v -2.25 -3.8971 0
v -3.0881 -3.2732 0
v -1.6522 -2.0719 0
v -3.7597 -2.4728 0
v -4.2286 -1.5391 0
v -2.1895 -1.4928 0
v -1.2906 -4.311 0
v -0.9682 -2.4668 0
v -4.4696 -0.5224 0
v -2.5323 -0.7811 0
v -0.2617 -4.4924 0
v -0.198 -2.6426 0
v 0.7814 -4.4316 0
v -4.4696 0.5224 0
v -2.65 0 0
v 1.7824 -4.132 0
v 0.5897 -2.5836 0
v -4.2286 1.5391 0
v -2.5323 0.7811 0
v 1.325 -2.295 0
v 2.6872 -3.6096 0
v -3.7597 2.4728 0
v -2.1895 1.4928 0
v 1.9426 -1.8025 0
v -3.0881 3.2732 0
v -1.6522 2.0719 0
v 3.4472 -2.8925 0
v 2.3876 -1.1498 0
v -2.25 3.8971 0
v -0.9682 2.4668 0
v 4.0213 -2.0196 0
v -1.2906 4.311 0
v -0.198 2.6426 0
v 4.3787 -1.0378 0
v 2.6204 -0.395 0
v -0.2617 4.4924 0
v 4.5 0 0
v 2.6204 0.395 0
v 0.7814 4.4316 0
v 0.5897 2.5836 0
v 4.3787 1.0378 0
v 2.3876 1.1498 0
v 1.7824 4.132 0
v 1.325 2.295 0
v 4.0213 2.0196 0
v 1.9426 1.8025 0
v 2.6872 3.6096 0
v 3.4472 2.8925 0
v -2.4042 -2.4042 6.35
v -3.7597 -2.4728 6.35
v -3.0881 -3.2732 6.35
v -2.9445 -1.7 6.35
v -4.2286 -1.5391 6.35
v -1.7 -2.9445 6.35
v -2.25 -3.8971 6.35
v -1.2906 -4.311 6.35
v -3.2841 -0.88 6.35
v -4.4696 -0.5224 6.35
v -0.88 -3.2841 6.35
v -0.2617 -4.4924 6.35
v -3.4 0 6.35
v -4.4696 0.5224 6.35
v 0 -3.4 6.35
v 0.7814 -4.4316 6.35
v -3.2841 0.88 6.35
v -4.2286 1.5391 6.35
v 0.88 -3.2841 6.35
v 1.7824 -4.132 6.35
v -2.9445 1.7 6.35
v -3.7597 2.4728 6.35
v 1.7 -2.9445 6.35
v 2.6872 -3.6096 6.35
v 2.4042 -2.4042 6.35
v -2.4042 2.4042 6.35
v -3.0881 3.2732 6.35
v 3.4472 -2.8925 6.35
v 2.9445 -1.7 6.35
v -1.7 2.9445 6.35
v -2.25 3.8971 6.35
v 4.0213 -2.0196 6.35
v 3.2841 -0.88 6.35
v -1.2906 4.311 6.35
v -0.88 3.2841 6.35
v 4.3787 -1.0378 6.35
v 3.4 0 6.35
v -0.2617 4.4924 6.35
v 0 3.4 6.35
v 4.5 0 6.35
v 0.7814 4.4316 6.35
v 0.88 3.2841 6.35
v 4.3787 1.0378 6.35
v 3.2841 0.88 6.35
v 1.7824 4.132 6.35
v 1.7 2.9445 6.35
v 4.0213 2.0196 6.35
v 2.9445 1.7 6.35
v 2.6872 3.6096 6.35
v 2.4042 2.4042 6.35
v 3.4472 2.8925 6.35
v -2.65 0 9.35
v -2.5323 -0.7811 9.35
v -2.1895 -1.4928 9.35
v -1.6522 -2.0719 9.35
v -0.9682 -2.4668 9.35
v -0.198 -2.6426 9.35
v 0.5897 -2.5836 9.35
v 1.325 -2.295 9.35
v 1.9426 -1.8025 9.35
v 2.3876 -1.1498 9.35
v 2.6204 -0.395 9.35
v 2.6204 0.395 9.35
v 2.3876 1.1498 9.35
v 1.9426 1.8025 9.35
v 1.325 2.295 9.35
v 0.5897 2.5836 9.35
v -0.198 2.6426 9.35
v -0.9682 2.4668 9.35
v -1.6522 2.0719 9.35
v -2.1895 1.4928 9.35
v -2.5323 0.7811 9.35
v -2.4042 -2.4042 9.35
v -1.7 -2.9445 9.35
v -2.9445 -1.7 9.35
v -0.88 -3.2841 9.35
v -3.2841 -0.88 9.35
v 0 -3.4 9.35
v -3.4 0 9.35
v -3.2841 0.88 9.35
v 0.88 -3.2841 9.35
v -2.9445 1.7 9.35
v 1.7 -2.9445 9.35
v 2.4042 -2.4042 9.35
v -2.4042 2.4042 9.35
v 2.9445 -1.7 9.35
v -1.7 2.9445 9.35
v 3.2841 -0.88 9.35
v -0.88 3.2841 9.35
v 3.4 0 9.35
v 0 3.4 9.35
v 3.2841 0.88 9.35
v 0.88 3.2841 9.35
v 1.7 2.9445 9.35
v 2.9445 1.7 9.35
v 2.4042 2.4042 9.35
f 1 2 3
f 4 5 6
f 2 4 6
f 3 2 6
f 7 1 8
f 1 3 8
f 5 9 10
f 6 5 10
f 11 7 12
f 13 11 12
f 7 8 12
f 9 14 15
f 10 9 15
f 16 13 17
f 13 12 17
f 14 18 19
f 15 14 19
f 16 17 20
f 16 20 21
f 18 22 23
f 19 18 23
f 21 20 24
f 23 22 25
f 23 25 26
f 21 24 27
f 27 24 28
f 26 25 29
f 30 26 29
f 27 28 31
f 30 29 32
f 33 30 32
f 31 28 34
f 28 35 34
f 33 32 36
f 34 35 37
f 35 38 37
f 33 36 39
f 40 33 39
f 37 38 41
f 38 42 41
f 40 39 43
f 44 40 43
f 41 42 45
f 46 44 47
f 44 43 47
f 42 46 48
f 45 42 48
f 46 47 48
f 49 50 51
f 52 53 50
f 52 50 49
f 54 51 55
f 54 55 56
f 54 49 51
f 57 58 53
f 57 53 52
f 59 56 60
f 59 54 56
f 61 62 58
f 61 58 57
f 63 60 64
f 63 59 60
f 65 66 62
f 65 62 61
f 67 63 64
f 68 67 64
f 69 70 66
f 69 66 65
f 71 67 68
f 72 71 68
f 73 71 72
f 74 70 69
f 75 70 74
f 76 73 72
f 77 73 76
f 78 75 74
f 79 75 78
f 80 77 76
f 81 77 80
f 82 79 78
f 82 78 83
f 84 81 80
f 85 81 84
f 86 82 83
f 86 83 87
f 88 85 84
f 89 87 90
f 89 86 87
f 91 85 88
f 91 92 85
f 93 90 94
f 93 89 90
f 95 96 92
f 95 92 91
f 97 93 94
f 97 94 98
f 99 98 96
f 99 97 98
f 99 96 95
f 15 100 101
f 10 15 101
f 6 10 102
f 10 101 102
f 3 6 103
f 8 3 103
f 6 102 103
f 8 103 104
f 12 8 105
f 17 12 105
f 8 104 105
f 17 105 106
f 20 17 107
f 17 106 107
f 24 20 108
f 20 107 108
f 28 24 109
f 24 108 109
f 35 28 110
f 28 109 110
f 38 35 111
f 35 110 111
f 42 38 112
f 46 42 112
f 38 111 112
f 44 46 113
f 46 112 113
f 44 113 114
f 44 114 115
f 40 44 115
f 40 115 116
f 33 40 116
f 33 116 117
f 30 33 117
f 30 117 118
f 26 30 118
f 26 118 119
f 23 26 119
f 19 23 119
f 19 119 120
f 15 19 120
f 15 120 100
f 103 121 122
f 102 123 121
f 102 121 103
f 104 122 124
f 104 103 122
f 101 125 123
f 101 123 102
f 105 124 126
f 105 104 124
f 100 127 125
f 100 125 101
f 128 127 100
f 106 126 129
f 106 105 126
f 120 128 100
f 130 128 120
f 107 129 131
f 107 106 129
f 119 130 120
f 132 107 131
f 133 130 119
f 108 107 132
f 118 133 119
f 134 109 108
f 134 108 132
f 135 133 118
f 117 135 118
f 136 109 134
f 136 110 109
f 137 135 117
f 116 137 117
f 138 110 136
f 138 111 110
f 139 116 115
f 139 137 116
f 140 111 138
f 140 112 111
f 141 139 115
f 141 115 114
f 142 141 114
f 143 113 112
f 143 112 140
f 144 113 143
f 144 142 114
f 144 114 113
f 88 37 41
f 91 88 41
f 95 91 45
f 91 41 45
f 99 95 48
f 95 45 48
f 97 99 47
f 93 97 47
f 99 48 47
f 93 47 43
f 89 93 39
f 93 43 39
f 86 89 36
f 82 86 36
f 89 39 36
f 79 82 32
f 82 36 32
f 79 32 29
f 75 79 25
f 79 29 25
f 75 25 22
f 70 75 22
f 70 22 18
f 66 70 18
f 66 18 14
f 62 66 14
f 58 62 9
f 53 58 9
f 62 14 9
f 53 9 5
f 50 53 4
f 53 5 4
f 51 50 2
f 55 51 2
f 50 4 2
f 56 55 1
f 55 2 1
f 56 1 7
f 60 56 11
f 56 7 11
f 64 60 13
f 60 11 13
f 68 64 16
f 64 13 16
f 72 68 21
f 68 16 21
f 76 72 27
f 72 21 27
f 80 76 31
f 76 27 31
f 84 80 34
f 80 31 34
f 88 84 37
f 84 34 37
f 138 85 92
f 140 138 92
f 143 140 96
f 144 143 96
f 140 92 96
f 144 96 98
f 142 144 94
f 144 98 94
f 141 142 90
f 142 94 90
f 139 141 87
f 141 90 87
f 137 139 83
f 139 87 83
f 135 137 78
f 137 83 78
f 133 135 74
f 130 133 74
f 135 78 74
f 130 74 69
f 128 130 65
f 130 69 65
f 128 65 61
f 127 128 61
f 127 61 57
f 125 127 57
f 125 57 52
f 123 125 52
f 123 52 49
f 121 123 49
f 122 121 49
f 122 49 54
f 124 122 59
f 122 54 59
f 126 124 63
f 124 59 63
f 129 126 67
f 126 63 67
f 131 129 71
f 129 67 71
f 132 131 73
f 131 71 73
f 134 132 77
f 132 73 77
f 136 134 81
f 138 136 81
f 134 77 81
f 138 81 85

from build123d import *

# Parameters (mm, degrees)
F0_R     = 4.5
F1_DEPTH = 6.35
F2_R     = 3.4
F3_DEPTH = 3
F4_D     = 5.3


with BuildPart() as f1:
    # F0 (on Top) → F1 (new body)
    with BuildSketch(Plane.XY):
        Circle(F0_R)
    extrude(amount=F1_DEPTH)

    # F2 (on face) → F3 (join)
    with BuildSketch(Plane.XY.offset(6.35)):
        Circle(F2_R)
    extrude(amount=F3_DEPTH)

    # F4 (through all)
    with Locations(Plane(origin=(0, 0, 0), x_dir=(1, 0, 0), z_dir=(0, 0, -1))):
        with Locations((0, 0)):
            Hole(F4_D / 2)


solid = f1.part
